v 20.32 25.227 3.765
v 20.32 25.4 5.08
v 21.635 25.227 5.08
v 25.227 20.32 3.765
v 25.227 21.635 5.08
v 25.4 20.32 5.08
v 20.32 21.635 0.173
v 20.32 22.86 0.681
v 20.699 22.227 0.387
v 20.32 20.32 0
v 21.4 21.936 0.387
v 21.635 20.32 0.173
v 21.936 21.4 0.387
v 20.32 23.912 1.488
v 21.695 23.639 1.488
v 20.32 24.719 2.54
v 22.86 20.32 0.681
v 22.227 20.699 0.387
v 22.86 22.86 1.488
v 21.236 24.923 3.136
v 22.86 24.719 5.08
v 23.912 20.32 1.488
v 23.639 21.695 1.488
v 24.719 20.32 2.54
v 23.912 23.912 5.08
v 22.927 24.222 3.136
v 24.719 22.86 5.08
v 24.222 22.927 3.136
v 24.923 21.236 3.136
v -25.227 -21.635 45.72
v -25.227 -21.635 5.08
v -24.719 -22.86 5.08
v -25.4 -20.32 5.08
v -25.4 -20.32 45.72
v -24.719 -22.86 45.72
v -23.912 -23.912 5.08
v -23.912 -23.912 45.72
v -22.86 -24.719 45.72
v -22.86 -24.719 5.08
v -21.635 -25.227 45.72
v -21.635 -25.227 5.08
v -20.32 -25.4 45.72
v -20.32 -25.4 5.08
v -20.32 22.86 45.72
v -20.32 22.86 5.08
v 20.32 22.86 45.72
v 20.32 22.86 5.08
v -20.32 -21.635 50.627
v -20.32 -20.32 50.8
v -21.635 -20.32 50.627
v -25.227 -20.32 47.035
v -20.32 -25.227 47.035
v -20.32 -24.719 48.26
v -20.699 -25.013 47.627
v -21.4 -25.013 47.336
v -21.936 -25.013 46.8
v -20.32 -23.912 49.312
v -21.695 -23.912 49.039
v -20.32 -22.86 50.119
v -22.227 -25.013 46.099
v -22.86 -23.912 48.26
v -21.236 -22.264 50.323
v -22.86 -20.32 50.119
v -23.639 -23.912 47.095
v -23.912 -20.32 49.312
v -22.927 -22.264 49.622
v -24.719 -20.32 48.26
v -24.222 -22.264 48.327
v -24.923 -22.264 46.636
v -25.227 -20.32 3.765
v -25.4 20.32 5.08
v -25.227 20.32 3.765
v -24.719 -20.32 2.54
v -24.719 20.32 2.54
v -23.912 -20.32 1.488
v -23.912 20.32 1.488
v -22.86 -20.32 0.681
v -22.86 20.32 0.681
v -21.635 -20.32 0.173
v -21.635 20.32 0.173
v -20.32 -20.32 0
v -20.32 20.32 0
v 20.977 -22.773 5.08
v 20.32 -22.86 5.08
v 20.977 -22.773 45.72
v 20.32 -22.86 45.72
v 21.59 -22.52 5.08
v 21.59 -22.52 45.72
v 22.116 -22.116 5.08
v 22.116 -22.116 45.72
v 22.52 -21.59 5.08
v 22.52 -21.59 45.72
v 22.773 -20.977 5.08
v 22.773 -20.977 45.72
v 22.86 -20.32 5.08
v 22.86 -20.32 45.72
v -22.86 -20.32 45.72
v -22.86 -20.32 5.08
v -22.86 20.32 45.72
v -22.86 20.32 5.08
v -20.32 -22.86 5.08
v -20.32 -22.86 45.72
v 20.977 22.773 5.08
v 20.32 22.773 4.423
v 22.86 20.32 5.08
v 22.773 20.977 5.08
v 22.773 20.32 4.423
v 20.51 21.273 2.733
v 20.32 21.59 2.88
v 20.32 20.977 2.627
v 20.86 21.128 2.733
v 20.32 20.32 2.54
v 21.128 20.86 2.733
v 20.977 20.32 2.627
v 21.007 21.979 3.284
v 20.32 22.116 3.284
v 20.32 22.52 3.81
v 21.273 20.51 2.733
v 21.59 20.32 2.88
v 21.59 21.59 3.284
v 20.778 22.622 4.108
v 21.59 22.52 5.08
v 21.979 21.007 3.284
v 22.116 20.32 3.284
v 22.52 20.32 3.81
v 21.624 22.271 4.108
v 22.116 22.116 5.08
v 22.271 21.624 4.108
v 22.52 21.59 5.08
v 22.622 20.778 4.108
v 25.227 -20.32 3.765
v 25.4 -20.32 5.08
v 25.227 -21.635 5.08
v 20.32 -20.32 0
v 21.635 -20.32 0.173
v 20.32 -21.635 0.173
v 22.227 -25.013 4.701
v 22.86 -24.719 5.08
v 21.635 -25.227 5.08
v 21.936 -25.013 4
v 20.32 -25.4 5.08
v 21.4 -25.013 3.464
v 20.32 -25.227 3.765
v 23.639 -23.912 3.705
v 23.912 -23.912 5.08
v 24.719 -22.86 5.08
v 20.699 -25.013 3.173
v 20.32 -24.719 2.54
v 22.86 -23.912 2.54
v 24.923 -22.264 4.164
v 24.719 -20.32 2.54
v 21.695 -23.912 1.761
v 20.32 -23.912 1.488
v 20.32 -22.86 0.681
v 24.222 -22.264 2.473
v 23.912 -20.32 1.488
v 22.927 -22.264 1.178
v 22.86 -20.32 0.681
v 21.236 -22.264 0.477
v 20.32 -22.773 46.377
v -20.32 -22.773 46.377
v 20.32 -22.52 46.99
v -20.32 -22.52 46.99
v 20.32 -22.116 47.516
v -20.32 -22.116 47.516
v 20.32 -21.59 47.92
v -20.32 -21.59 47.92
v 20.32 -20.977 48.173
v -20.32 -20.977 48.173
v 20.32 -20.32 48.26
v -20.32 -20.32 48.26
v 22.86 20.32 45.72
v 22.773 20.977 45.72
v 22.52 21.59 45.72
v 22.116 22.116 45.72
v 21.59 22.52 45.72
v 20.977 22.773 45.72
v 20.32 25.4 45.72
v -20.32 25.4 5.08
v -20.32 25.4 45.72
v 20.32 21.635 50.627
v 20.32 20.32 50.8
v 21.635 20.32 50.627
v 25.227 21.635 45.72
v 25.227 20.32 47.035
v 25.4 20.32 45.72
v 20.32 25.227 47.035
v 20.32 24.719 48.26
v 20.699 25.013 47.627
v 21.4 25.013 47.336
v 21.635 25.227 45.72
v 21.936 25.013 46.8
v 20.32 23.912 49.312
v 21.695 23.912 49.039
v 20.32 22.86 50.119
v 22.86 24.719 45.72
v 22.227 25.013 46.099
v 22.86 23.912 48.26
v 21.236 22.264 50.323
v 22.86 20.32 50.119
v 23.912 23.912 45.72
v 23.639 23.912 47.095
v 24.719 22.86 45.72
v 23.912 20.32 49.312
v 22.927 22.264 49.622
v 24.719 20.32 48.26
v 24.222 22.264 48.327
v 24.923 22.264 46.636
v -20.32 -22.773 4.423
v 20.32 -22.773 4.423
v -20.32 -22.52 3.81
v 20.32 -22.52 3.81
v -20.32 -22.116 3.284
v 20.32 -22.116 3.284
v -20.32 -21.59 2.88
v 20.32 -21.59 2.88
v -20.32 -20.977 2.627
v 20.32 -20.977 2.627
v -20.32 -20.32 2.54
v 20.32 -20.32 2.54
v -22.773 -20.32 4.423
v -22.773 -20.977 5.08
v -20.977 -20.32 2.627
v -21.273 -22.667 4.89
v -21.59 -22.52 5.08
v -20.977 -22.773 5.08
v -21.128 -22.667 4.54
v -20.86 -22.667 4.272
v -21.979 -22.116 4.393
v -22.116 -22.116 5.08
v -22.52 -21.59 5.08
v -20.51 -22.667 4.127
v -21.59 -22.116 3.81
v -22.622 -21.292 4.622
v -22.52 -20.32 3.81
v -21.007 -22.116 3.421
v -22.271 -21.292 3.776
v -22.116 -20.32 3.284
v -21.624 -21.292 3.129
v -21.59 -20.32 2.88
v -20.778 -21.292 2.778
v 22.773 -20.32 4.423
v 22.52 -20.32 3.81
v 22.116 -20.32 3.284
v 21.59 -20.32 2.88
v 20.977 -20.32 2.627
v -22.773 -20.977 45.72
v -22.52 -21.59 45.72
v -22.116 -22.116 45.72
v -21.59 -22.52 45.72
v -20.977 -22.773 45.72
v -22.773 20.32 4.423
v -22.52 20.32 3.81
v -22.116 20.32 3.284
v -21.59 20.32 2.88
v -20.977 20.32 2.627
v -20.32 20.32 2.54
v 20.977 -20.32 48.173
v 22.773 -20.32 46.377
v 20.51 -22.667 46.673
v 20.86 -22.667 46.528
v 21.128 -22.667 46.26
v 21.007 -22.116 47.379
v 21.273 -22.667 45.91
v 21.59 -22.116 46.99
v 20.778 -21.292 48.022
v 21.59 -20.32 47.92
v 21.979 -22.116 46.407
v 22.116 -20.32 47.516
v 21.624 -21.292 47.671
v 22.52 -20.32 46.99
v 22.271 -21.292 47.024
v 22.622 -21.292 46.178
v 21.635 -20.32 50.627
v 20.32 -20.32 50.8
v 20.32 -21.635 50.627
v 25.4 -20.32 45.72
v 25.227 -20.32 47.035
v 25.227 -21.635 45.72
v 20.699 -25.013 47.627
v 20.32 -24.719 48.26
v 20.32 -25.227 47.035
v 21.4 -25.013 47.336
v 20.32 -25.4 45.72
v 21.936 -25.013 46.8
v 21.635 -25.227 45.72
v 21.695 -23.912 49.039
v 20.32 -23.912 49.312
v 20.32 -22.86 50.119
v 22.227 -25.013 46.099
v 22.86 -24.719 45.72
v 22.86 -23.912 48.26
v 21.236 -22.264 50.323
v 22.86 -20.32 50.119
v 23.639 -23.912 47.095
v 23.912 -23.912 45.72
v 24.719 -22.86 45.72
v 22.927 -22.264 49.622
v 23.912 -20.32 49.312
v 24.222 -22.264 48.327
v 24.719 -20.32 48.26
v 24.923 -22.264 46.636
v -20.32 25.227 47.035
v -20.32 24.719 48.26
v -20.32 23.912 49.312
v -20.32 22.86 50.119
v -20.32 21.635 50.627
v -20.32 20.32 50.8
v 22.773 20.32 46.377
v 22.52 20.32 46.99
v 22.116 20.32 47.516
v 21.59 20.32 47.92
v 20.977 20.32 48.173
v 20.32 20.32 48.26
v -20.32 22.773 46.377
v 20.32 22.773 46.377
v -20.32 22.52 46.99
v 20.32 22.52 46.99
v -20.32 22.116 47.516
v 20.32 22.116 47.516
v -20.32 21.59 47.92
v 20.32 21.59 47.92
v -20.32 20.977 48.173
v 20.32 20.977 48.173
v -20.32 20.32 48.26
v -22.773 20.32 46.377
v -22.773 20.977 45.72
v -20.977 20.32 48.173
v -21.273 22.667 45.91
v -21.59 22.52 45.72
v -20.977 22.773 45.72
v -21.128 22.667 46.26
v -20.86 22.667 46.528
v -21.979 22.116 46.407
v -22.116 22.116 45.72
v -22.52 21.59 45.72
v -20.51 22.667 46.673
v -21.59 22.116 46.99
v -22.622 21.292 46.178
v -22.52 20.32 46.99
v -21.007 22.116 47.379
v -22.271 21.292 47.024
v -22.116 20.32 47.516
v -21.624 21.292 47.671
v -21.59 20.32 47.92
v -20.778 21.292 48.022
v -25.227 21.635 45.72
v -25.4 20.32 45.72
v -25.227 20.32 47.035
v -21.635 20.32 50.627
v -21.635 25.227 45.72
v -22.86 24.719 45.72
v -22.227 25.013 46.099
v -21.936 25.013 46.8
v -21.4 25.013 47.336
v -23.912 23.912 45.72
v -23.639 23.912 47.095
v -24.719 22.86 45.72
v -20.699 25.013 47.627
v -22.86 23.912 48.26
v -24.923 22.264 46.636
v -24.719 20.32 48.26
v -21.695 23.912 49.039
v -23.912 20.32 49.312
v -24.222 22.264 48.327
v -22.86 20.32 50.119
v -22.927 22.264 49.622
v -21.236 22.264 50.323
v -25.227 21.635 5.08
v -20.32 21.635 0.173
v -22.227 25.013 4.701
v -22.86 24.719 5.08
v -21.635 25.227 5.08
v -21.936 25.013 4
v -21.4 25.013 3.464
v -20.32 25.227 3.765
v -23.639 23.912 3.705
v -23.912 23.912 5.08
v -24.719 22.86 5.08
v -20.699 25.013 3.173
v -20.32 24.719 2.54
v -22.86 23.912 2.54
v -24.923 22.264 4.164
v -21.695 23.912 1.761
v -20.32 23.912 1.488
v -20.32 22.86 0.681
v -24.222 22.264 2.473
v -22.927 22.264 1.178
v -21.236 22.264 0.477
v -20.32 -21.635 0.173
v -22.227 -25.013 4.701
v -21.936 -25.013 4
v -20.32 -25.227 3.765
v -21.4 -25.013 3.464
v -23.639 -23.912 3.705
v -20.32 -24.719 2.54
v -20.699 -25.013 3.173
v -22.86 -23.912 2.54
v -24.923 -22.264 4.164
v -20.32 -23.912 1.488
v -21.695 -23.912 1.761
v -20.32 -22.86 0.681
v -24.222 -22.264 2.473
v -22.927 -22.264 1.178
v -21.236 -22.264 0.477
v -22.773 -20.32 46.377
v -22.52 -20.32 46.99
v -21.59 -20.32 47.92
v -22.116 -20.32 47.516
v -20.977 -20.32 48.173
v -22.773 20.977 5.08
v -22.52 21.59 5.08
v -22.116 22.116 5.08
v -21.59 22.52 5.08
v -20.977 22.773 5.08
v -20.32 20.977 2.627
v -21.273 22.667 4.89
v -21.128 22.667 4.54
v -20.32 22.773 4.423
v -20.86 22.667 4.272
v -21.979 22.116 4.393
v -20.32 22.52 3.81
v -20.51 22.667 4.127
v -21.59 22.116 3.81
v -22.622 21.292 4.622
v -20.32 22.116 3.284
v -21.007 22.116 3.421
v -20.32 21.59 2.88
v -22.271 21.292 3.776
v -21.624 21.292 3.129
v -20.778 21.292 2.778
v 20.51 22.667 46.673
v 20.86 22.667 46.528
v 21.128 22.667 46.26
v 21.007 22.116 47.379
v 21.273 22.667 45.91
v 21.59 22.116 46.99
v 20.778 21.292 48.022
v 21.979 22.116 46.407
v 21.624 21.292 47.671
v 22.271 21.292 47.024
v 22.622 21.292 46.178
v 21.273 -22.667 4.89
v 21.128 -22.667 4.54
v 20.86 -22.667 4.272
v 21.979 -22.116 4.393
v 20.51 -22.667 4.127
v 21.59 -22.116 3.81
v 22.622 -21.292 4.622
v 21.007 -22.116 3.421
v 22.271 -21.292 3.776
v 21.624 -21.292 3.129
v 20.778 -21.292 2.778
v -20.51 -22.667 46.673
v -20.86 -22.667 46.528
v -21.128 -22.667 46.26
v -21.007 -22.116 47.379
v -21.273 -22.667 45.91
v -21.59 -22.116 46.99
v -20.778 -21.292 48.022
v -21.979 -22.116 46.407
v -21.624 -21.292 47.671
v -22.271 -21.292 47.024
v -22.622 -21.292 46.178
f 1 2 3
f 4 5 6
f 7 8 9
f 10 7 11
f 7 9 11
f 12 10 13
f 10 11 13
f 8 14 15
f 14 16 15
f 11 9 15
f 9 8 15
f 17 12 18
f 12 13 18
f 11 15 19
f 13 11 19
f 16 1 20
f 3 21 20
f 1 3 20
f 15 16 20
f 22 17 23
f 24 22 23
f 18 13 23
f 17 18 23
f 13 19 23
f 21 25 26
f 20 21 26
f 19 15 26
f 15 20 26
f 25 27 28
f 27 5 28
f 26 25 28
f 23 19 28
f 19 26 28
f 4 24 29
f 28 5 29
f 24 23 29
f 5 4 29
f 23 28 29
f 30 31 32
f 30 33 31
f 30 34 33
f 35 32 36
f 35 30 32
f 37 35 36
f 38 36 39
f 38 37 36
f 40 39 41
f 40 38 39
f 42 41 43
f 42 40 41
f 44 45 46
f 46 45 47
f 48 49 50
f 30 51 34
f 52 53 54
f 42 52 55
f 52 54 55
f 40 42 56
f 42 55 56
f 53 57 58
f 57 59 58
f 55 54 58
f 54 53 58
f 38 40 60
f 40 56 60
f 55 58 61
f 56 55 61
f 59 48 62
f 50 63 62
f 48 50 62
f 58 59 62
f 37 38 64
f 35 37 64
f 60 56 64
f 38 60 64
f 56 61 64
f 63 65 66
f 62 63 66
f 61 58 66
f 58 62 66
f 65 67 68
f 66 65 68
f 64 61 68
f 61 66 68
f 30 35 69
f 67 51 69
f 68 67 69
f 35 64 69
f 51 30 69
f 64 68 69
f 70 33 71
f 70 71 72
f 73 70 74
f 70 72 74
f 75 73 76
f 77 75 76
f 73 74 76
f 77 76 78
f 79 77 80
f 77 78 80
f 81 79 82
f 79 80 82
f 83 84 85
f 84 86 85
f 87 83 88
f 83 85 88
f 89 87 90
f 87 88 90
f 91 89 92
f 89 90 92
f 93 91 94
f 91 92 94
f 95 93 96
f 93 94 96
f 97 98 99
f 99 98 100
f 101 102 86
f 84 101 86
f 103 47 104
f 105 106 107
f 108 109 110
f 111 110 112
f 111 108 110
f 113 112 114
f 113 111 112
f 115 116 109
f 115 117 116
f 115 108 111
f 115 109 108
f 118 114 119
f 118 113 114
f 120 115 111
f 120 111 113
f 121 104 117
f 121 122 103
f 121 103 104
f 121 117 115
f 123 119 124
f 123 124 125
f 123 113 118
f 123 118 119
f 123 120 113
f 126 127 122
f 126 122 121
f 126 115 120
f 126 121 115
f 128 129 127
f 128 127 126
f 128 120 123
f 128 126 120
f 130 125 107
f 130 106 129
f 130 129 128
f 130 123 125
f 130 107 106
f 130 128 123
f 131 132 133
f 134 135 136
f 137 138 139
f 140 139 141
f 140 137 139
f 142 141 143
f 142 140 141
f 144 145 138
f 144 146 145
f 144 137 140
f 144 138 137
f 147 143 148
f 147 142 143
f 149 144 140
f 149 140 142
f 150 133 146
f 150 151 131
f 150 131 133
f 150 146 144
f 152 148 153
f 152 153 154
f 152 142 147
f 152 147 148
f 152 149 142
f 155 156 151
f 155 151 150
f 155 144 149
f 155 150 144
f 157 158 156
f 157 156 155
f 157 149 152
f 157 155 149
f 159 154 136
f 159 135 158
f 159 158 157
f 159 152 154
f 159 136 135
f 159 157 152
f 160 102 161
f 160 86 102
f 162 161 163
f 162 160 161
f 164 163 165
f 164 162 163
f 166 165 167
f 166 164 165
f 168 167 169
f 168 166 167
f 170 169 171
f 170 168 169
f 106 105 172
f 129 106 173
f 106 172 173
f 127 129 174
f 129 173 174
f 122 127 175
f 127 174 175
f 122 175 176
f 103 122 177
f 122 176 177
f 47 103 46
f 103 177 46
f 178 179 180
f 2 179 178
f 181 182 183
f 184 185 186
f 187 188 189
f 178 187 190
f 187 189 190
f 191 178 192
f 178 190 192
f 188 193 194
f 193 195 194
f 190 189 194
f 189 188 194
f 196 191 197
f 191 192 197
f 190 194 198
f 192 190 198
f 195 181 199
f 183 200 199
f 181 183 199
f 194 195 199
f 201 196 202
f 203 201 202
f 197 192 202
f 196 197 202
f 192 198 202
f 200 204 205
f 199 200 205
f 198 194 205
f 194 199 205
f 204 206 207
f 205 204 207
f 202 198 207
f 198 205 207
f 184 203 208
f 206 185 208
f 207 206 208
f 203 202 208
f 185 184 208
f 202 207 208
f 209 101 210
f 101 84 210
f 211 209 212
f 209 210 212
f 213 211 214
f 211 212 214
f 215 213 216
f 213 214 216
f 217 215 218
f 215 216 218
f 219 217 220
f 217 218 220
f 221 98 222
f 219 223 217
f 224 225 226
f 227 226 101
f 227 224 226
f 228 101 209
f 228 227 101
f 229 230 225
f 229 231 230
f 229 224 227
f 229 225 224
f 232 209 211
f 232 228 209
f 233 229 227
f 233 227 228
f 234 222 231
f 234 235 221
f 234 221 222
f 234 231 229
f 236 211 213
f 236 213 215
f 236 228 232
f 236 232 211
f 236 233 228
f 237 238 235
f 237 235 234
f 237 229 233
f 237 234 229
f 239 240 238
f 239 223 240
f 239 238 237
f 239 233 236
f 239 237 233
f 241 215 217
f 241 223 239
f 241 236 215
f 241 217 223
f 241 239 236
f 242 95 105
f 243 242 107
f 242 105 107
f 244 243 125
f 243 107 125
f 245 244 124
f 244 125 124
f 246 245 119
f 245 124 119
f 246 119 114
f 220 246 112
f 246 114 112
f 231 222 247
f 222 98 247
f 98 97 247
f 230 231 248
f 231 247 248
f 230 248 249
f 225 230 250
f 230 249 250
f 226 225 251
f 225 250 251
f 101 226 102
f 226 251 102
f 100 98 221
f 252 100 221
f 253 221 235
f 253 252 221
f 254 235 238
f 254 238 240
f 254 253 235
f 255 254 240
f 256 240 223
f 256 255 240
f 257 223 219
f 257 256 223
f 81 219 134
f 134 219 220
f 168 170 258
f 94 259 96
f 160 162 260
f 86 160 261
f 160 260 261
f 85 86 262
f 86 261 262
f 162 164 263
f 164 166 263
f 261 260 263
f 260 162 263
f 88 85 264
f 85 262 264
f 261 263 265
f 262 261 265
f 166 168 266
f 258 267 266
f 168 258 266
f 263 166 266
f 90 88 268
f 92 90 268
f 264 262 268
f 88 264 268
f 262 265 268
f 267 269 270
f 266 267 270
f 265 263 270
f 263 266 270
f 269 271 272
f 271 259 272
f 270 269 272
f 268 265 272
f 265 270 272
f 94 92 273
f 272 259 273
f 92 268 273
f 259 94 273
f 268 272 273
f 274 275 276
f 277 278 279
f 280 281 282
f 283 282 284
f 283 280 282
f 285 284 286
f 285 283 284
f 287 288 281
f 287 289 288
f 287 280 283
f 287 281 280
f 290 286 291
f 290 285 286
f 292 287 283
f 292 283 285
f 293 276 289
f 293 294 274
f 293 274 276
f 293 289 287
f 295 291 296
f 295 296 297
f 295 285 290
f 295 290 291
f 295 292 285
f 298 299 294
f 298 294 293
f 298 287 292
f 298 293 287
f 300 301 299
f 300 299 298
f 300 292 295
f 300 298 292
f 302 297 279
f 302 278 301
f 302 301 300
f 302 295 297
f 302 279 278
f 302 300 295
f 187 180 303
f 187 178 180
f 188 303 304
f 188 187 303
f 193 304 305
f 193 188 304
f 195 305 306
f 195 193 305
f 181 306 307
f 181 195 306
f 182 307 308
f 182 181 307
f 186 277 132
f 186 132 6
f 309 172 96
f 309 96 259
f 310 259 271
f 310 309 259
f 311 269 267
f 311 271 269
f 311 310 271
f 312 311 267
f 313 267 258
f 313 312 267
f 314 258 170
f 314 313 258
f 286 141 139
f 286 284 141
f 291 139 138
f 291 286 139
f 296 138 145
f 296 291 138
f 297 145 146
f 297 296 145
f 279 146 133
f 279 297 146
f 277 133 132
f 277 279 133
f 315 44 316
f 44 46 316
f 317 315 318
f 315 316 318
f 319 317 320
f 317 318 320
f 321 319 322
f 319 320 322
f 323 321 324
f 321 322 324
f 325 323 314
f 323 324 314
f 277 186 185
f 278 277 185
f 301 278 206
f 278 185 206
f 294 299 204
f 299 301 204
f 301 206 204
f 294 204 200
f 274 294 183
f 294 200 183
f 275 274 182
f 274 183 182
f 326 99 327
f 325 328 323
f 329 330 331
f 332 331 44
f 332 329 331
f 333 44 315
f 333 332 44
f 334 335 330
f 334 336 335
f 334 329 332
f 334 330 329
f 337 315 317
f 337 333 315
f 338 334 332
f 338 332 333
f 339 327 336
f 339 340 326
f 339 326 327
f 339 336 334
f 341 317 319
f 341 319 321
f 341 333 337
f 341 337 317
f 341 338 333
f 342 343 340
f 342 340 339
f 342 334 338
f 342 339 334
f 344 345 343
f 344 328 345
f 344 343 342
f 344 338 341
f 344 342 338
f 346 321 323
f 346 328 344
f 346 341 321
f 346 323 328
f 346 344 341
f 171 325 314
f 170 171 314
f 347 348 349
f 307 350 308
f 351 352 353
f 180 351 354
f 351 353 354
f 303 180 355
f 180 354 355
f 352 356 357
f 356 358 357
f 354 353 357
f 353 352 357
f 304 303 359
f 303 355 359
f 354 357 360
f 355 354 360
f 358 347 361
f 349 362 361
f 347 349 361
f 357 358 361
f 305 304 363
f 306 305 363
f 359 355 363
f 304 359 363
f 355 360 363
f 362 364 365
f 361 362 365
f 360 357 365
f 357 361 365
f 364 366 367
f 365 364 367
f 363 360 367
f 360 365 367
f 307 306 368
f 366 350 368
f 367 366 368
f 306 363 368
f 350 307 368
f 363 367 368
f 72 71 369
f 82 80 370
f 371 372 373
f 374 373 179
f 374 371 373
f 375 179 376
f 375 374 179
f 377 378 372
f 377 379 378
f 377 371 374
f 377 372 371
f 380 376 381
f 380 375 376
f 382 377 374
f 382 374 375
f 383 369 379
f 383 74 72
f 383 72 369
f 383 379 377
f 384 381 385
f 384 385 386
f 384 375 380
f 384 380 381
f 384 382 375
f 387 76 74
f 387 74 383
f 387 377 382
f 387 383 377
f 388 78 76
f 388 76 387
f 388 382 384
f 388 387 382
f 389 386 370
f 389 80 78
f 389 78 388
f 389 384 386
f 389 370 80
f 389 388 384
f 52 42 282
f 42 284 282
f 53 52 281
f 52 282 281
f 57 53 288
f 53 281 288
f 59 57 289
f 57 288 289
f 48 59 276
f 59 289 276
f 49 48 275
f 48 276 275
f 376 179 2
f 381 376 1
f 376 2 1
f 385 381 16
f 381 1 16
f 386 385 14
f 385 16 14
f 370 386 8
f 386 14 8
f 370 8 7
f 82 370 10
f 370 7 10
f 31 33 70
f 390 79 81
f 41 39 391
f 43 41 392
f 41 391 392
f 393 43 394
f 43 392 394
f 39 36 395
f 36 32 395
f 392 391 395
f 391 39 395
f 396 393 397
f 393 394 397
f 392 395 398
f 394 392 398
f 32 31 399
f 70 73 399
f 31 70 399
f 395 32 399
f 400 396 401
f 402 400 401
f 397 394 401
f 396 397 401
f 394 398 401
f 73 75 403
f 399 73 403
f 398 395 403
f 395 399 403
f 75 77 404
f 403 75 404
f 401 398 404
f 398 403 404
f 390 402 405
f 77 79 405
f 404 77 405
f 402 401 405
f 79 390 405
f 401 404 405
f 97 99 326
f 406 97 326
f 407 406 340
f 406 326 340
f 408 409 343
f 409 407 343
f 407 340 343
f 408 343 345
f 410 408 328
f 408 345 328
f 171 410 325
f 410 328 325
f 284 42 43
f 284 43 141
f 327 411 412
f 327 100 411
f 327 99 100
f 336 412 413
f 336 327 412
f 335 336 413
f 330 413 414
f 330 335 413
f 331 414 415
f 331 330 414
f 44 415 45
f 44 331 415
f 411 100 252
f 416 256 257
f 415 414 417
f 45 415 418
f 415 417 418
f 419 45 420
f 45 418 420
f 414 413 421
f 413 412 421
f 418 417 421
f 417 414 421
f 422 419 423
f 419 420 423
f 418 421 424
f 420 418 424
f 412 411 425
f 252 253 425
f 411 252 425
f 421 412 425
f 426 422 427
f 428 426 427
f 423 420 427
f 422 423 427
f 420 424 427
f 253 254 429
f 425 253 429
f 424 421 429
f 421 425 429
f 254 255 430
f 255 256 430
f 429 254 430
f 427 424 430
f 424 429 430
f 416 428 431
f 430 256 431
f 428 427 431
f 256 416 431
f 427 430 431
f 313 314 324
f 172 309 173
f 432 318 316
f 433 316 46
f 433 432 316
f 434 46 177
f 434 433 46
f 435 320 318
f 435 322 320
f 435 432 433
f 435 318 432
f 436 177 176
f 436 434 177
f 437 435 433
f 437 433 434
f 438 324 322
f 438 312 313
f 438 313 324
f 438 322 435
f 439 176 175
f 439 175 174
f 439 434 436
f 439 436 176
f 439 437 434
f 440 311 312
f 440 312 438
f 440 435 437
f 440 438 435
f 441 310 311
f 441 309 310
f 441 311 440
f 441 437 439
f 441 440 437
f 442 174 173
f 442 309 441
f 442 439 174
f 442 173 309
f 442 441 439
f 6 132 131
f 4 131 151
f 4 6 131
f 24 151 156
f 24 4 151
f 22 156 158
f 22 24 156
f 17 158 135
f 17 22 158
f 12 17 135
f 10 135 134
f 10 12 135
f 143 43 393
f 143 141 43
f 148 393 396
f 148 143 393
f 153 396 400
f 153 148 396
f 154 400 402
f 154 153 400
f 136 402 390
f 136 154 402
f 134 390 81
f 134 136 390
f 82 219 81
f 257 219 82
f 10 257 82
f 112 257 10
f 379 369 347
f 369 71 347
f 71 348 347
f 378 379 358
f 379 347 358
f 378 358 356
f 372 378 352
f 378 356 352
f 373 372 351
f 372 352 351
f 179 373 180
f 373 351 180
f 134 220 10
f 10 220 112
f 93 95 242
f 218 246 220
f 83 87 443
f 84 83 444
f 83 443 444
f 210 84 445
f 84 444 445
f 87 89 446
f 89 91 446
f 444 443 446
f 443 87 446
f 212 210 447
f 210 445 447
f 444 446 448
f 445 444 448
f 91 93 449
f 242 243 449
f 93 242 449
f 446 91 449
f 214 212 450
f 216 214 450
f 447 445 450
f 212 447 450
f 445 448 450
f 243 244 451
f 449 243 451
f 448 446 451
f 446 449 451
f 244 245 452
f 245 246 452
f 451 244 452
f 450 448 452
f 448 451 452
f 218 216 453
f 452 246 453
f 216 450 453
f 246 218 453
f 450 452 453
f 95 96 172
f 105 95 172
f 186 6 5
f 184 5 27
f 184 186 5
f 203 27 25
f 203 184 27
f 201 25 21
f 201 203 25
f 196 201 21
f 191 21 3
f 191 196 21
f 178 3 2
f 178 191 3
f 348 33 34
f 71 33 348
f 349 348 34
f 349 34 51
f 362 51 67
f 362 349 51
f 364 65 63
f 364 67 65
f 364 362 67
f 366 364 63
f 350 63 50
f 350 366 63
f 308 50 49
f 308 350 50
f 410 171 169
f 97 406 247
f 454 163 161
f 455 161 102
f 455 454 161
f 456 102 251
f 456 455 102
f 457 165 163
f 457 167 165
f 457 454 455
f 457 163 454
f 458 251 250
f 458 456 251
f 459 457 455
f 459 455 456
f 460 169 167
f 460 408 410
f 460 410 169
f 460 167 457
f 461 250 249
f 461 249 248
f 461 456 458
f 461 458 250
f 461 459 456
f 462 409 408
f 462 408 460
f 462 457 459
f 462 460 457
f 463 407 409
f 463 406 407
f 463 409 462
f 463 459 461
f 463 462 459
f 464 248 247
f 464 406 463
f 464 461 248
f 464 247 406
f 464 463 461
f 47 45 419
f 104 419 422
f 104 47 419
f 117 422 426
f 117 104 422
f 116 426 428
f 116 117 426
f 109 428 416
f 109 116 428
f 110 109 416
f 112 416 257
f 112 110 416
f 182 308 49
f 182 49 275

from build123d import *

# Parameters (mm, degrees)
F0_W     = 50.8
F0_H     = 50.8
F1_DEPTH = 50.8
F2_R     = 5.08
F3_T     = -2.54


# Not quite as in the source:
# - a shell that OpenCascade refuses in one call is made with other operations: the cavity is built on its own and cut out


with BuildPart() as f1:
    # F0 (on Top) → F1 (new body)
    with BuildSketch(Plane.XY):
        Rectangle(F0_W, F0_H)
    extrude(amount=F1_DEPTH)

    # F2
    f2_edges = [f1.edges().sort_by_distance(p)[0] for p in [
        (-25.4, 0, 0),
        (-25.4, 0, 50.8),
        (-25.4, 25.4, 25.4),
        (25.4, 0, 50.8),
        (0, 25.4, 50.8),
        (0, -25.4, 50.8),
        (-25.4, -25.4, 25.4),
        (25.4, 25.4, 25.4),
        (0, 25.4, 0),
        (25.4, 0, 0),
        (25.4, -25.4, 25.4),
        (0, -25.4, 0),
    ]]
    fillet(f2_edges, radius=F2_R)

    # F3: a shell. OpenCascade refuses it in one call, so the cavity is built on its own and cut out:
    # the body offset inwards by the wall thickness, plus a prism from it out through each open face.
    f3_core = offset(f1.part, amount=F3_T, mode=Mode.PRIVATE)
    f3_exits = [f3_core.faces().sort_by_distance(p)[0] for p in [
        (0, 0, 2.54),
    ]]
    add(f3_core, mode=Mode.SUBTRACT)
    extrude(f3_exits, amount=-F3_T, mode=Mode.SUBTRACT)


solid = f1.part
